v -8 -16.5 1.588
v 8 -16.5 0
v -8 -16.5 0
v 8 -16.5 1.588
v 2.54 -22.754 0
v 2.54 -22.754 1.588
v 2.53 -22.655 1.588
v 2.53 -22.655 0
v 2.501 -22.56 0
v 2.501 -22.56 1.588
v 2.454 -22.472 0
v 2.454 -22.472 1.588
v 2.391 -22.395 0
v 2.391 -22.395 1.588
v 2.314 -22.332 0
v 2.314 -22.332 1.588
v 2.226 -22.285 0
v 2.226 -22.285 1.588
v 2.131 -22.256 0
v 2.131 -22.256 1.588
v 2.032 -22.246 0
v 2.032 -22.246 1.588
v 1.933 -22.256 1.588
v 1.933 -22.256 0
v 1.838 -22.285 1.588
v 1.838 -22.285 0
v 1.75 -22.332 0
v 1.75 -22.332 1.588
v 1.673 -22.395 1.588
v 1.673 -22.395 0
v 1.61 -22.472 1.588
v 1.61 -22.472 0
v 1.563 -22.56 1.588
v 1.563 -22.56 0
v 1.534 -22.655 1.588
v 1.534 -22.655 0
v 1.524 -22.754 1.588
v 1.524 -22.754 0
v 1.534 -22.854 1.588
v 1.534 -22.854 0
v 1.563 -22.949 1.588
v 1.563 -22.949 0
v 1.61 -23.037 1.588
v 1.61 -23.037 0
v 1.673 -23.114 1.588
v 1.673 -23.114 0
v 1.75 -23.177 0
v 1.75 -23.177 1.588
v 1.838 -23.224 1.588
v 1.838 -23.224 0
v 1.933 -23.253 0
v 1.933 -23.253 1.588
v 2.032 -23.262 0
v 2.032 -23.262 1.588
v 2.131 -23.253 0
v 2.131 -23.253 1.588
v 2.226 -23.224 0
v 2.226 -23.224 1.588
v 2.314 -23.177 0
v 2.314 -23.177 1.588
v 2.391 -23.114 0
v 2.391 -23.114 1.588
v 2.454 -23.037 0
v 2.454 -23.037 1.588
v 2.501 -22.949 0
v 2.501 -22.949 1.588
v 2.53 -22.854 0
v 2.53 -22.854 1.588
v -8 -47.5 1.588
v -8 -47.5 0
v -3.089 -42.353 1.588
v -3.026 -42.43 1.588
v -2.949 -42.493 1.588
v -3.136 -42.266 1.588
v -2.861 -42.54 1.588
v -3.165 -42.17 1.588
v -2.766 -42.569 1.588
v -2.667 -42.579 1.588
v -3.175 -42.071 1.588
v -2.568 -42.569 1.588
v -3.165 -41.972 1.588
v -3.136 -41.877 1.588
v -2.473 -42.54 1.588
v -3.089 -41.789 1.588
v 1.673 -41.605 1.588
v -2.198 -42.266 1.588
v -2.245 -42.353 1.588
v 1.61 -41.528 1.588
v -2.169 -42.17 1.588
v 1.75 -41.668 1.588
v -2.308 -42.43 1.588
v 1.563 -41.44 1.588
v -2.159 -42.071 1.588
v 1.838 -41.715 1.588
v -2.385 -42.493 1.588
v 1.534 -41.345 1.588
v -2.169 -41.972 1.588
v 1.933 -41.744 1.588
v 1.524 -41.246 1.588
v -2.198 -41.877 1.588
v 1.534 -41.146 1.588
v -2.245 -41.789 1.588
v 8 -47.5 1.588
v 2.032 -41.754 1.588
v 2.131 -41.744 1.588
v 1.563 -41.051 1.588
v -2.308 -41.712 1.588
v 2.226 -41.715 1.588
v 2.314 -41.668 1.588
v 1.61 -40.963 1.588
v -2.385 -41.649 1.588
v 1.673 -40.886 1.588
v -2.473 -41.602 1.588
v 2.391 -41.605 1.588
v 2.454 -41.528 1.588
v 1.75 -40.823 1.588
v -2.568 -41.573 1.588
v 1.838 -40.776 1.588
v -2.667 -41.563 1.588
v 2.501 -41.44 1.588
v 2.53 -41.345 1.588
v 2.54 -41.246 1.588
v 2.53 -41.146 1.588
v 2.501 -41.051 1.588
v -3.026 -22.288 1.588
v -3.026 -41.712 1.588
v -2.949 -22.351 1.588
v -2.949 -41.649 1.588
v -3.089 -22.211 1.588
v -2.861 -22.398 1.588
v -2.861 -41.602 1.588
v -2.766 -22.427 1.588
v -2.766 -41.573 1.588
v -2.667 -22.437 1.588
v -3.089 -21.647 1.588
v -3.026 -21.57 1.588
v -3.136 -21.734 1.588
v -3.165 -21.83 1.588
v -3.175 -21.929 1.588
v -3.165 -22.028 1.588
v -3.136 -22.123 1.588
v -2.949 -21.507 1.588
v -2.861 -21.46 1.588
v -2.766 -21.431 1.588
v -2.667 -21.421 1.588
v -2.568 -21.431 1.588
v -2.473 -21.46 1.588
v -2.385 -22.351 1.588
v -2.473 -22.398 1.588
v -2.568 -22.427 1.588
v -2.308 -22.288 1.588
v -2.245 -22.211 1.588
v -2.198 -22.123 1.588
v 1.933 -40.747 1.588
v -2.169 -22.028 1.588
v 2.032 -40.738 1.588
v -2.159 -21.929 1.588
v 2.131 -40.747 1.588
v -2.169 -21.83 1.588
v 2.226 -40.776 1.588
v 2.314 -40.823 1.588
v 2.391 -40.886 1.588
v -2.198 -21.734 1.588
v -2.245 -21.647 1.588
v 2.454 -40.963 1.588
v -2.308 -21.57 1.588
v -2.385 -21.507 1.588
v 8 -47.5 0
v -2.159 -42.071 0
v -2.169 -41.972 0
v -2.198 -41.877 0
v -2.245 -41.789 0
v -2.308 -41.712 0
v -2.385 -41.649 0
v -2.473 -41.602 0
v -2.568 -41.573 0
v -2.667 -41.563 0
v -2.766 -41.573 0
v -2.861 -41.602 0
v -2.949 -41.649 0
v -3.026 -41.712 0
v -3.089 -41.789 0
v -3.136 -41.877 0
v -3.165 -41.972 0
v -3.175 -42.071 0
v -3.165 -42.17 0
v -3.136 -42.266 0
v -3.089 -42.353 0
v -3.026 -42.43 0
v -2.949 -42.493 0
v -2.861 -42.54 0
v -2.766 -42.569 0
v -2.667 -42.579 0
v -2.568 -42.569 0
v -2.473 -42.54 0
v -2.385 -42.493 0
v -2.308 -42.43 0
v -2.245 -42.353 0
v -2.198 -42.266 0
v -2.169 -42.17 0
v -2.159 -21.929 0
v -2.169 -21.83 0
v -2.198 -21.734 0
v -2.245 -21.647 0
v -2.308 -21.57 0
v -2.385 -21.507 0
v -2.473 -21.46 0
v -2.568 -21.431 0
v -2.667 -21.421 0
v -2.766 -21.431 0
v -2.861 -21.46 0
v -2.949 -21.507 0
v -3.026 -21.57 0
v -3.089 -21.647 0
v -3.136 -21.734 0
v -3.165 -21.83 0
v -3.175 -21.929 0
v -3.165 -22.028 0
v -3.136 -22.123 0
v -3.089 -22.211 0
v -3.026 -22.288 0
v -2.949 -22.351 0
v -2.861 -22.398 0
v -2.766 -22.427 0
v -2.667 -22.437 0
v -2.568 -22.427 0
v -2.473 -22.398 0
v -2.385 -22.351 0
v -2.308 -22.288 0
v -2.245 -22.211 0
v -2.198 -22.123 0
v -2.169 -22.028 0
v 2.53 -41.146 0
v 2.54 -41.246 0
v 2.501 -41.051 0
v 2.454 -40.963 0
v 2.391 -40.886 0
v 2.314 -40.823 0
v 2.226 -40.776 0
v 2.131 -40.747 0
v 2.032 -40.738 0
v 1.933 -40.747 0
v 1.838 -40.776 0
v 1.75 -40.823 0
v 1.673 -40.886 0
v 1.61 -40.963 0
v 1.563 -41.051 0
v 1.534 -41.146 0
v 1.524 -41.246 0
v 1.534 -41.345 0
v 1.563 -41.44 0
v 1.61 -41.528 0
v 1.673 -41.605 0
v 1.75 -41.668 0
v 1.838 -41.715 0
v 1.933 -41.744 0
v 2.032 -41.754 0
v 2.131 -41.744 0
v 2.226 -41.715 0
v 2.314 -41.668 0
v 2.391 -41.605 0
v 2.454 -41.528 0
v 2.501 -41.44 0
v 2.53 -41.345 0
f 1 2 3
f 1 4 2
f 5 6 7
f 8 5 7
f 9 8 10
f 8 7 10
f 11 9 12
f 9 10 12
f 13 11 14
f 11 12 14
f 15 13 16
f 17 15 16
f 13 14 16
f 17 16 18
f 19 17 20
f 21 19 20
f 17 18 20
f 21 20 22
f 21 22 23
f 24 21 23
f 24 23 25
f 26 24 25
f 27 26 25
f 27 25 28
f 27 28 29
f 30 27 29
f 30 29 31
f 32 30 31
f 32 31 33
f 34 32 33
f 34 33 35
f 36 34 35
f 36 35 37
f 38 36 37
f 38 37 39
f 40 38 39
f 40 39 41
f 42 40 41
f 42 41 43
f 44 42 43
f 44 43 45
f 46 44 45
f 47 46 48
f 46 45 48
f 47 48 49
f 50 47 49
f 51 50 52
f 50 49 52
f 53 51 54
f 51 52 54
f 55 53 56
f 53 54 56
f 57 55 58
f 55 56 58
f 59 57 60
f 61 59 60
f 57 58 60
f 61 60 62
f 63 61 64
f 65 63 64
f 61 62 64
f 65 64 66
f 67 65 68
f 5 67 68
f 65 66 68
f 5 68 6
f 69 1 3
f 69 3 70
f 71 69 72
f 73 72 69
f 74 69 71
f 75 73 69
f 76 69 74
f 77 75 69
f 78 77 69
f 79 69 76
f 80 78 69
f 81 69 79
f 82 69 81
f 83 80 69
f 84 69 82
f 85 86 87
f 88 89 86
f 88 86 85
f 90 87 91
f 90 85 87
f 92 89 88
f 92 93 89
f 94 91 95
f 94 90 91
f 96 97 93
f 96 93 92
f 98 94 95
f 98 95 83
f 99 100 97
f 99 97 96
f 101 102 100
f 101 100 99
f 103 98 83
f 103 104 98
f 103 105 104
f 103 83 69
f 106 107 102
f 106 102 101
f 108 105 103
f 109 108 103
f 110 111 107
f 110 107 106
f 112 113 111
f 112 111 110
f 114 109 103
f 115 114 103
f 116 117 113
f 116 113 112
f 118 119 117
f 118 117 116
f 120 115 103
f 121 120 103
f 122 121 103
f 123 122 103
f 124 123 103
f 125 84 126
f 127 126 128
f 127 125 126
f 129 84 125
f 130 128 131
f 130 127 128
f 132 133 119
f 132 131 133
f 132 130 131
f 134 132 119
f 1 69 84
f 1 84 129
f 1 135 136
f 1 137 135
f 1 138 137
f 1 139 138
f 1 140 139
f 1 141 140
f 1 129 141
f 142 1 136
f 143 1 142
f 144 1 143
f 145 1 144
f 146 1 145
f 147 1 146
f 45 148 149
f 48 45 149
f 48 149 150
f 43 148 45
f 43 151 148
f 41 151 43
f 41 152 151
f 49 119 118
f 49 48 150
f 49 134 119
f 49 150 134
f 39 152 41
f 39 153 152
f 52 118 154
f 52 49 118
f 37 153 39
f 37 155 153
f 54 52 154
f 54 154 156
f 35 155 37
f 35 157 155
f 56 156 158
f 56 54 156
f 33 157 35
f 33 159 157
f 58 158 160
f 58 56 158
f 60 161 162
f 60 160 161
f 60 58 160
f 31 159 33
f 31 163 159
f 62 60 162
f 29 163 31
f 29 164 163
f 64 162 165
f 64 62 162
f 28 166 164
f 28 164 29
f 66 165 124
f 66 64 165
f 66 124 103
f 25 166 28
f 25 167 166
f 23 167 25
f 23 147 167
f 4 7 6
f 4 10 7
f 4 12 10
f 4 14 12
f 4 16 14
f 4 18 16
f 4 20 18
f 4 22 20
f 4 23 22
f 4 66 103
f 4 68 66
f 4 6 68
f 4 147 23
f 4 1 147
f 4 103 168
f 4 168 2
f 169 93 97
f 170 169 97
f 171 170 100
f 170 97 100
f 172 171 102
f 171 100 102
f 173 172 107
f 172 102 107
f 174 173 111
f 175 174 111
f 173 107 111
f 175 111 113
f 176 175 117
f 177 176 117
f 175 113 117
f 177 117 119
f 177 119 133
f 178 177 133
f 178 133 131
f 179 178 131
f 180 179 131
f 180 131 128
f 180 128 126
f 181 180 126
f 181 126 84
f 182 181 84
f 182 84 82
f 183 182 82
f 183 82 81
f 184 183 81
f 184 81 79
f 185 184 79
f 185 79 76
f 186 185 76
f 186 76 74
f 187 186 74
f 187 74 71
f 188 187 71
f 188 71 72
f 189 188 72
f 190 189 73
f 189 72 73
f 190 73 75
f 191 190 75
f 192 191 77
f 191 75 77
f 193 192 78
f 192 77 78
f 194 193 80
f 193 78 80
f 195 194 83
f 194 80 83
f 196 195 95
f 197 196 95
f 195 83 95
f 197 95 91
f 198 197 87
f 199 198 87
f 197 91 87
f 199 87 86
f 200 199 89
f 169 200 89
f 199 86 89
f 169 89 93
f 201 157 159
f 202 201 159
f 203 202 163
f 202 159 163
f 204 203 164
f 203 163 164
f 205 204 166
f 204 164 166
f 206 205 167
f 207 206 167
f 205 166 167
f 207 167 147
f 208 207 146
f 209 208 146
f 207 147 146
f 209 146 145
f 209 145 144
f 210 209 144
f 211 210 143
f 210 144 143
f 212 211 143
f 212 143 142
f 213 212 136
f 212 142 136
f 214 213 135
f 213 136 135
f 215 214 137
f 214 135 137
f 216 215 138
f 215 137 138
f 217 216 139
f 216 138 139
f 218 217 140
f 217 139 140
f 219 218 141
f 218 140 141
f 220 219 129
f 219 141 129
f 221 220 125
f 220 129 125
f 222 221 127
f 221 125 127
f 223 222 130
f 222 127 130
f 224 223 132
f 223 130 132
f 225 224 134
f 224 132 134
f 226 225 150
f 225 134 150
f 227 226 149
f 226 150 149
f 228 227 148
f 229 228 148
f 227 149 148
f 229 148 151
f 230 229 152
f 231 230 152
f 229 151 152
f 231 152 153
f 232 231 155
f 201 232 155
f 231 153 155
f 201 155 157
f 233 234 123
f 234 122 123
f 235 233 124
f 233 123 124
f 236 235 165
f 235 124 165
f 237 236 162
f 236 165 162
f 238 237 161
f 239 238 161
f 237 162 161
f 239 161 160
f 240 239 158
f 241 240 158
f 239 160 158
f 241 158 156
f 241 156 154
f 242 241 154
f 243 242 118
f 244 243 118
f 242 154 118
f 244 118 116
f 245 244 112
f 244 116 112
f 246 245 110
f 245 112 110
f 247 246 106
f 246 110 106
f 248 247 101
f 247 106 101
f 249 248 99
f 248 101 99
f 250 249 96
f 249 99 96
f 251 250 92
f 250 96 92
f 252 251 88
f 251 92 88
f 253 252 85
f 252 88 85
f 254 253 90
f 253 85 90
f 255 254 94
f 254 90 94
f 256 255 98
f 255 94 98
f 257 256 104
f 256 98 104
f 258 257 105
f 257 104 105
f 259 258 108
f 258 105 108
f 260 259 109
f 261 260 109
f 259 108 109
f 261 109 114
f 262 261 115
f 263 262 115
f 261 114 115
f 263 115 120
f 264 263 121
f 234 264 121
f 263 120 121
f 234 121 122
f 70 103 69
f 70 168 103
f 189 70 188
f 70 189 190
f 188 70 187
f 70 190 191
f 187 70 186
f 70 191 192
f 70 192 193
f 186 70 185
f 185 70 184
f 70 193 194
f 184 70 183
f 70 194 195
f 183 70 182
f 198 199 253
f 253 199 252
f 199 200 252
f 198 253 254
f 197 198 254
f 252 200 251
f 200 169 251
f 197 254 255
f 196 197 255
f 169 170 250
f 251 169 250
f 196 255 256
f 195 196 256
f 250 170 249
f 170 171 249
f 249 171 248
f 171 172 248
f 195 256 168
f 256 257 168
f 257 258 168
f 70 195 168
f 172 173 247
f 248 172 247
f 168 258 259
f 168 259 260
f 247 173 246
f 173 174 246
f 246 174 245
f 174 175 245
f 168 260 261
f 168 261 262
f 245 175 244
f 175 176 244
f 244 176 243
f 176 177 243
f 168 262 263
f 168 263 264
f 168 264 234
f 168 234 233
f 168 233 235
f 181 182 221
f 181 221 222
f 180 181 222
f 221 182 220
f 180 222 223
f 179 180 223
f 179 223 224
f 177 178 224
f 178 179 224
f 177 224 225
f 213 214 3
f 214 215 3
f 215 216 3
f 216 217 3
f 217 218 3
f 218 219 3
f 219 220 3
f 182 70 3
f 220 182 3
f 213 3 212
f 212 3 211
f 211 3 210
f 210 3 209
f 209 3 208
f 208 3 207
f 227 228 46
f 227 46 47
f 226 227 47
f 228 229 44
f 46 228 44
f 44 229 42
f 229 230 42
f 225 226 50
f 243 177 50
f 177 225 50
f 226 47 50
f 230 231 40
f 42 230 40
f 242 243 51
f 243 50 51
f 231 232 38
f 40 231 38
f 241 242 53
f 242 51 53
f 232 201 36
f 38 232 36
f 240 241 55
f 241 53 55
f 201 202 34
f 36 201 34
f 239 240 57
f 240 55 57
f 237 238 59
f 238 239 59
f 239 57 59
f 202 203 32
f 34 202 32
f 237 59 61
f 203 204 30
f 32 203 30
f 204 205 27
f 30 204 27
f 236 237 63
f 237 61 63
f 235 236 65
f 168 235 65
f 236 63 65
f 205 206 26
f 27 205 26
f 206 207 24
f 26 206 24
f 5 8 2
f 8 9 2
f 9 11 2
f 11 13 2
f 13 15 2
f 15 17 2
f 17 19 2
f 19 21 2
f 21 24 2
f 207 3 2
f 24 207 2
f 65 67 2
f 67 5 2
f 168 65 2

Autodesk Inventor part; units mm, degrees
sketch "AL_spacer_contact_Zminus" plane through (0, 0, 0) normal (0, 0, 1) x (1, 0, 0)
  circle A0 centre (39.5, 39.5) radius 3.175
  circle A1 centre (39.5, -39.5) radius 3.175
  circle A2 centre (-39.5, -39.5) radius 3.175
  circle A3 centre (-39.5, 39.5) radius 3.175
  point P0 (0, 0)
  dimension "d228" = 39.5
  dimension "d229" = 39.5
  dimension "d230" = 39.5
  dimension "d231" = 39.5
  dimension "d232" = 39.5
  dimension "d233" = 39.5
  dimension "d234" = 39.5
  dimension "d235" = 39.5
  dimension "d236" = 6.35
sketch "Delrin_stayout_Zminus" plane through (0, 0, 0) normal (0, 0, 1) x (1, 0, 0)
  line L0 (47.5, 39.5) -> (47.5, 31)
  line L1 (47.5, 31) -> (39.5, 31)
  line L2 (39.5, 31) -> (31, 39.5)
  line L3 (31, 39.5) -> (31, 47.5)
  line L4 (31, 47.5) -> (39.5, 47.5)
  line L5 (39.5, 47.5) -> (47.5, 39.5)
  line L6 (-39.5, 47.5) -> (-47.5, 39.5)
  line L7 (-47.5, 39.5) -> (-47.5, 31)
  line L8 (-47.5, 31) -> (-39.5, 31)
  line L9 (-39.5, 31) -> (-31, 39.5)
  line L10 (-31, 39.5) -> (-31, 47.5)
  line L11 (-31, 47.5) -> (-39.5, 47.5)
  line L12 (47.5, -39.5) -> (39.5, -47.5)
  line L13 (39.5, -47.5) -> (31, -47.5)
  line L14 (31, -47.5) -> (31, -39.5)
  line L15 (31, -39.5) -> (39.5, -31)
  line L16 (39.5, -31) -> (47.5, -31)
  line L17 (47.5, -31) -> (47.5, -39.5)
  line L18 (-39.5, -47.5) -> (-47.5, -39.5)
  line L19 (-47.5, -39.5) -> (-47.5, -31)
  line L20 (-47.5, -31) -> (-39.5, -31)
  line L21 (-39.5, -31) -> (-31, -39.5)
  line L22 (-31, -39.5) -> (-31, -47.5)
  line L23 (-31, -47.5) -> (-39.5, -47.5)
  point P0 (0, 0)
  dimension "d243" = 16.5
  dimension "d244" = 8
  dimension "d245" = 8.5
  dimension "d246" = 16.5
  dimension "d247" = 47.5
  dimension "d248" = 47.5
  dimension "d249" = 47.5
  dimension "d250" = 47.5
  dimension "d251" = 47.5
  dimension "d252" = 47.5
  dimension "d253" = 47.5
  dimension "d254" = 47.5
sketch "Nub_stayout_Zminus" plane through (0, 0, 0) normal (0, 0, 1) x (1, 0, 0)
  line L0 (29, 47.5) -> (39.5, 47.5)
  line L1 (39.5, 47.5) -> (47.5, 39.5)
  line L2 (47.5, 39.5) -> (47.5, 29)
  line L3 (47.5, 29) -> (42, 29)
  line L4 (42, 29) -> (42, 40.4125)
  line L5 (40.4125, 42) -> (29, 42)
  line L6 (29, 42) -> (29, 47.5)
  arc A0 (42, 40.4125) -> (40.4125, 42) centre (40.4125, 40.4125) ccw
  line L7 (-29, 47.5) -> (-39.5, 47.5)
  line L8 (-39.5, 47.5) -> (-47.5, 39.5)
  line L9 (-47.5, 39.5) -> (-47.5, 29)
  line L10 (-47.5, 29) -> (-42, 29)
  line L11 (-42, 29) -> (-42, 40.4125)
  line L12 (-40.4125, 42) -> (-29, 42)
  line L13 (-29, 42) -> (-29, 47.5)
  arc A1 (-40.4125, 42) -> (-42, 40.4125) centre (-40.4125, 40.4125) ccw
  line L14 (-47.5, -29) -> (-42, -29)
  line L15 (-42, -29) -> (-42, -40.4125)
  line L16 (-40.4125, -42) -> (-29, -42)
  line L17 (-29, -42) -> (-29, -47.5)
  line L18 (-29, -47.5) -> (-39.5, -47.5)
  line L19 (-39.5, -47.5) -> (-47.5, -39.5)
  line L20 (-47.5, -39.5) -> (-47.5, -29)
  arc A2 (-42, -40.4125) -> (-40.4125, -42) centre (-40.4125, -40.4125) ccw
  line L21 (47.5, -29) -> (42, -29)
  line L22 (42, -29) -> (42, -40.4125)
  line L23 (40.4125, -42) -> (29, -42)
  line L24 (29, -42) -> (29, -47.5)
  line L25 (29, -47.5) -> (39.5, -47.5)
  line L26 (39.5, -47.5) -> (47.5, -39.5)
  line L27 (47.5, -39.5) -> (47.5, -29)
  arc A3 (40.4125, -42) -> (42, -40.4125) centre (40.4125, -40.4125) ccw
  point P0 (0, 0)
  dimension "d255" = 1.5875
  dimension "d256" = 18.5
  dimension "d257" = 8
  dimension "d258" = 5.5
  dimension "d259" = 47.5
  dimension "d260" = 47.5
  dimension "d264" = 1.5875
  dimension "d265" = 47.5
  dimension "d266" = 47.5
  dimension "d267" = 1.5875
  dimension "d268" = 47.5
  dimension "d269" = 47.5
  dimension "d270" = 1.5875
  dimension "d271" = 47.5
  dimension "d272" = 47.5
ref_plane "Zplus_face" through (0, 0, 1.5875) normal (0, 0, 1) x (1, 0, 0)
sketch "AL_spacer_contact_Zplus" plane through (0, 0, 1.5875) normal (0, 0, 1) x (1, 0, 0)
  circle A0 centre (-39.5, 39.5) radius 3.175
  circle A1 centre (-39.5, -39.5) radius 3.175
  circle A2 centre (39.5, -39.5) radius 3.175
  circle A3 centre (39.5, 39.5) radius 3.175
  point P0 (0, 0)
  dimension "d129" = 39.5
  dimension "d130" = 39.5
  dimension "d131" = 39.5
  dimension "d132" = 39.5
  dimension "d133" = 6.35
sketch "Delrin_stayout_Zplus" plane through (0, 0, 1.5875) normal (0, 0, 1) x (1, 0, 0)
  line L0 (47.5, -31) -> (47.5, -39.5)
  line L1 (47.5, -39.5) -> (39.5, -47.5)
  line L2 (39.5, -47.5) -> (31, -47.5)
  line L3 (31, -47.5) -> (31, -39.5)
  line L4 (31, -39.5) -> (39.5, -31)
  line L5 (39.5, -31) -> (47.5, -31)
  line L6 (47.5, 31) -> (47.5, 39.5)
  line L7 (47.5, 39.5) -> (39.5, 47.5)
  line L8 (39.5, 47.5) -> (31, 47.5)
  line L9 (31, 47.5) -> (31, 39.5)
  line L10 (31, 39.5) -> (39.5, 31)
  line L11 (39.5, 31) -> (47.5, 31)
  line L12 (-39.5, 47.5) -> (-47.5, 39.5)
  line L13 (-47.5, 39.5) -> (-47.5, 31)
  line L14 (-47.5, 31) -> (-39.5, 31)
  line L15 (-39.5, 31) -> (-31, 39.5)
  line L16 (-31, 39.5) -> (-31, 47.5)
  line L17 (-31, 47.5) -> (-39.5, 47.5)
  line L18 (-47.5, -39.5) -> (-39.5, -47.5)
  line L19 (-39.5, -47.5) -> (-31, -47.5)
  line L20 (-31, -47.5) -> (-31, -39.5)
  line L21 (-31, -39.5) -> (-39.5, -31)
  line L22 (-39.5, -31) -> (-47.5, -31)
  line L23 (-47.5, -31) -> (-47.5, -39.5)
  point P0 (0, 0)
  dimension "d115" = 16.5
  dimension "d116" = 16.5
  dimension "d117" = 8
  dimension "d118" = 8.5
  dimension "d121" = 47.5
  dimension "d122" = 47.5
  dimension "d123" = 47.5
  dimension "d124" = 47.5
  dimension "d125" = 47.5
  dimension "d126" = 47.5
  dimension "d127" = 47.5
  dimension "d128" = 47.5
sketch "Nub_stayout_Zplus" plane through (0, 0, 1.5875) normal (0, 0, 1) x (1, 0, 0)
  line L0 (47.5, 29) -> (42, 29)
  line L1 (42, 29) -> (42, 40.4125)
  line L2 (40.4125, 42) -> (29, 42)
  line L3 (29, 42) -> (29, 47.5)
  arc A0 (42, 40.4125) -> (40.4125, 42) centre (40.4125, 40.4125) ccw
  line L4 (29, 47.5) -> (39.5, 47.5)
  line L5 (39.5, 47.5) -> (47.5, 39.5)
  line L6 (47.5, 39.5) -> (47.5, 29)
  line L7 (-39.5, 47.5) -> (-29, 47.5)
  line L8 (-29, 47.5) -> (-29, 42)
  line L9 (-29, 42) -> (-40.4125, 42)
  line L10 (-42, 40.4125) -> (-42, 29)
  line L11 (-42, 29) -> (-47.5, 29)
  line L12 (-47.5, 29) -> (-47.5, 39.5)
  line L13 (-47.5, 39.5) -> (-39.5, 47.5)
  arc A1 (-40.4125, 42) -> (-42, 40.4125) centre (-40.4125, 40.4125) ccw
  line L14 (-47.5, -29) -> (-47.5, -39.5)
  line L15 (-47.5, -39.5) -> (-39.5, -47.5)
  line L16 (-39.5, -47.5) -> (-29, -47.5)
  line L17 (-29, -47.5) -> (-29, -42)
  line L18 (-29, -42) -> (-40.4125, -42)
  line L19 (-42, -40.4125) -> (-42, -29)
  line L20 (-42, -29) -> (-47.5, -29)
  arc A2 (-42, -40.4125) -> (-40.4125, -42) centre (-40.4125, -40.4125) ccw
  line L21 (29, -47.5) -> (39.5, -47.5)
  line L22 (39.5, -47.5) -> (47.5, -39.5)
  line L23 (47.5, -39.5) -> (47.5, -29)
  line L24 (47.5, -29) -> (42, -29)
  line L25 (42, -29) -> (42, -40.4125)
  line L26 (40.4125, -42) -> (29, -42)
  line L27 (29, -42) -> (29, -47.5)
  arc A3 (40.4125, -42) -> (42, -40.4125) centre (40.4125, -40.4125) ccw
  point P0 (0, 0)
  dimension "d146" = 1.5875
  dimension "d147" = 5.5
  dimension "d149" = 18.5
  dimension "d150" = 8
  dimension "d151" = 47.5
  dimension "d152" = 47.5
  dimension "d153" = 1.5875
  dimension "d154" = 47.5
  dimension "d155" = 47.5
  dimension "d156" = 1.5875
  dimension "d157" = 47.5
  dimension "d158" = 47.5
  dimension "d159" = 1.5875
  dimension "d160" = 47.5
  dimension "d161" = 47.5
sketch "Sketch1" plane through (0, 0, 0) normal (0, 0, 1) x (1, 0, 0)
  line L0 (-47.5, 47.5) -> (47.5, 47.5)
  line L1 (47.5, 47.5) -> (47.5, -47.5)
  line L2 (47.5, -47.5) -> (-47.5, -47.5)
  line L3 (-47.5, -47.5) -> (-47.5, 47.5)
  point P0 (0, 0)
  dimension "d0" = 95
  dimension "d1" = 95
  dimension "d2" = 47.5
  dimension "d3" = 47.5
extrude "Extrusion1" add sketch "Sketch1" along normal blind 1.5875
chamfer "Chamfer2" distance 11 angle 45 4 edges at (-47.5, -47.5, 0.7937) (47.5, -47.5, 0.7937) (47.5, 47.5, 0.7937) (-47.5, 47.5, 0.7937)
ref_plane "Work Plane_ConnX" through (-32, 0, 0) normal (1, 0, 0) x (0, 1, 0)
ref_plane "Work Plane_ConnY" through (0, 0, 0) normal (0, 1, 0) x (-1, 0, 0)
sketch "Sketch9" plane through (0, 0, 1.5875) normal (0, 0, 1) x (1, 0, 0)
  line L0 (47.5, 47.5) -> (47.5, -47.5) projected
  line L1 (58.5598, -32) -> (-58.5598, -32)
  circle A0 centre (-2.667, -21.9289) radius 0.508
  circle A1 centre (-2.667, -42.0711) radius 0.508
  line L2 (0, 26.5598) -> (0, -90.5598) construction
  point P0 (0, 0)
  point P1 (0, -32)
  dimension "d134" = 20.1422
  dimension "d136" = 2.667
  dimension "d138" = 1.016
  dimension "d141" = 180
  dimension "d350" = 32
  dimension "d351" = 0
extrude "Holes_Conn_Zminus" cut sketch "Sketch9" against normal through all
sketch "Sketch22" plane through (0, 0, 1.5875) normal (0, 0, 1) x (1, 0, 0)
  line L0 (47.5, 36.5) -> (47.5, -36.5) projected
  line L1 (0, -1.0026) -> (0, -62.9974) construction
  line L2 (62.8115, -32) -> (-62.8115, -32)
  circle A0 centre (2.032, -22.7545) radius 0.508
  circle A1 centre (2.032, -41.2455) radius 0.508
  point P0 (0, 0)
  point P1 (0, -32)
  dimension "d282" = 180
  dimension "d283" = 18.491
  dimension "d284" = 1.016
  dimension "d285" = 2.032
  dimension "d352" = 32
  dimension "d353" = 0
extrude "Holes_Conn_Zplus" cut sketch "Sketch22" against normal through all
hole "Hole5" at (39.5, 39.5, 1.5875) direction (0, 0, -1) diameter 3.2 end through all
mirror "Mirror5" about plane through (0, 0, 0) normal (1, 0, 0) of "Hole5"
mirror "Mirror6" about plane through (0, 0, 0) normal (0, 1, 0) of "Hole5", "Mirror5"
sketch "Sketch25" plane through (0, 0, 1.5875) normal (0, 0, 1) x (1, 0, 0)
  circle A0 centre (-39.5, -39.5) radius 1.6 projected
  circle A1 centre (39.5, -39.5) radius 1.6 projected
  circle A2 centre (-39.5, 39.5) radius 1.6 projected
  circle A3 centre (39.5, 39.5) radius 1.6 projected
  line L0 (36.5, -47.5) -> (-36.5, -47.5) projected
  line L1 (0, 0) -> (0, -59.2198)
  line L2 (8, -47.5) -> (8, -16.5)
  line L3 (8, -16.5) -> (-8, -16.5)
  line L4 (-8, -16.5) -> (-8, -47.5)
  line L5 (-8, -47.5) -> (-62.7516, -61.7336)
  line L6 (-62.7516, -61.7336) -> (-64.2933, 68.2222)
  line L7 (-64.2933, 68.2222) -> (58.3572, 62.5728)
  line L8 (58.3572, 62.5728) -> (56.5848, -69.017)
  line L9 (56.5848, -69.017) -> (8, -47.5)
  dimension "d362" = 16
  dimension "d363" = 31
extrude "Extrusion9" cut sketch "Sketch25" against normal through all contours L2 L3 L4 L5 L6 L7 L8 L9
sketch "Sketch26" plane through (0, 0, 1.5875) normal (0, 0, 1) x (1, 0, 0)
  line L0 (-8, -16.5) -> (-8, -47.5) projected
  line L1 (8, -47.5) -> (-8, -47.5) projected
  line L2 (8, -47.5) -> (8, -16.5) projected
  line L3 (8, -16.5) -> (-8, -16.5) projected
  line L4 (-8.0058, -16.503) -> (8, -16.5) construction
  line L5 (8, -16.5) -> (8.0058, -47.497) construction
  line L6 (8.0058, -47.497) -> (-8, -47.5) construction
  line L7 (-8, -47.5) -> (-8.0058, -16.503) construction
  point P0 (0, 0)
decal "Decal1"
sketch "Sketch27" plane through (0, 0, 0) normal (0, 0, -1) x (-1, 0, 0)
  line L0 (8, -47.5) -> (8, -16.5) projected
  line L1 (8, -16.5) -> (-8, -16.5) projected
  line L2 (-8, -16.5) -> (-8, -47.5) projected
  line L3 (-8, -47.5) -> (8, -47.5) projected
  line L4 (-8.0058, -16.503) -> (8, -16.5) construction
  line L5 (8, -16.5) -> (8.0058, -47.497) construction
  line L6 (8.0058, -47.497) -> (-8, -47.5) construction
  line L7 (-8, -47.5) -> (-8.0058, -16.503) construction
  point P0 (0, 0)
decal "Decal2"
properties part number "PCB_Batt2" material "FR4"
